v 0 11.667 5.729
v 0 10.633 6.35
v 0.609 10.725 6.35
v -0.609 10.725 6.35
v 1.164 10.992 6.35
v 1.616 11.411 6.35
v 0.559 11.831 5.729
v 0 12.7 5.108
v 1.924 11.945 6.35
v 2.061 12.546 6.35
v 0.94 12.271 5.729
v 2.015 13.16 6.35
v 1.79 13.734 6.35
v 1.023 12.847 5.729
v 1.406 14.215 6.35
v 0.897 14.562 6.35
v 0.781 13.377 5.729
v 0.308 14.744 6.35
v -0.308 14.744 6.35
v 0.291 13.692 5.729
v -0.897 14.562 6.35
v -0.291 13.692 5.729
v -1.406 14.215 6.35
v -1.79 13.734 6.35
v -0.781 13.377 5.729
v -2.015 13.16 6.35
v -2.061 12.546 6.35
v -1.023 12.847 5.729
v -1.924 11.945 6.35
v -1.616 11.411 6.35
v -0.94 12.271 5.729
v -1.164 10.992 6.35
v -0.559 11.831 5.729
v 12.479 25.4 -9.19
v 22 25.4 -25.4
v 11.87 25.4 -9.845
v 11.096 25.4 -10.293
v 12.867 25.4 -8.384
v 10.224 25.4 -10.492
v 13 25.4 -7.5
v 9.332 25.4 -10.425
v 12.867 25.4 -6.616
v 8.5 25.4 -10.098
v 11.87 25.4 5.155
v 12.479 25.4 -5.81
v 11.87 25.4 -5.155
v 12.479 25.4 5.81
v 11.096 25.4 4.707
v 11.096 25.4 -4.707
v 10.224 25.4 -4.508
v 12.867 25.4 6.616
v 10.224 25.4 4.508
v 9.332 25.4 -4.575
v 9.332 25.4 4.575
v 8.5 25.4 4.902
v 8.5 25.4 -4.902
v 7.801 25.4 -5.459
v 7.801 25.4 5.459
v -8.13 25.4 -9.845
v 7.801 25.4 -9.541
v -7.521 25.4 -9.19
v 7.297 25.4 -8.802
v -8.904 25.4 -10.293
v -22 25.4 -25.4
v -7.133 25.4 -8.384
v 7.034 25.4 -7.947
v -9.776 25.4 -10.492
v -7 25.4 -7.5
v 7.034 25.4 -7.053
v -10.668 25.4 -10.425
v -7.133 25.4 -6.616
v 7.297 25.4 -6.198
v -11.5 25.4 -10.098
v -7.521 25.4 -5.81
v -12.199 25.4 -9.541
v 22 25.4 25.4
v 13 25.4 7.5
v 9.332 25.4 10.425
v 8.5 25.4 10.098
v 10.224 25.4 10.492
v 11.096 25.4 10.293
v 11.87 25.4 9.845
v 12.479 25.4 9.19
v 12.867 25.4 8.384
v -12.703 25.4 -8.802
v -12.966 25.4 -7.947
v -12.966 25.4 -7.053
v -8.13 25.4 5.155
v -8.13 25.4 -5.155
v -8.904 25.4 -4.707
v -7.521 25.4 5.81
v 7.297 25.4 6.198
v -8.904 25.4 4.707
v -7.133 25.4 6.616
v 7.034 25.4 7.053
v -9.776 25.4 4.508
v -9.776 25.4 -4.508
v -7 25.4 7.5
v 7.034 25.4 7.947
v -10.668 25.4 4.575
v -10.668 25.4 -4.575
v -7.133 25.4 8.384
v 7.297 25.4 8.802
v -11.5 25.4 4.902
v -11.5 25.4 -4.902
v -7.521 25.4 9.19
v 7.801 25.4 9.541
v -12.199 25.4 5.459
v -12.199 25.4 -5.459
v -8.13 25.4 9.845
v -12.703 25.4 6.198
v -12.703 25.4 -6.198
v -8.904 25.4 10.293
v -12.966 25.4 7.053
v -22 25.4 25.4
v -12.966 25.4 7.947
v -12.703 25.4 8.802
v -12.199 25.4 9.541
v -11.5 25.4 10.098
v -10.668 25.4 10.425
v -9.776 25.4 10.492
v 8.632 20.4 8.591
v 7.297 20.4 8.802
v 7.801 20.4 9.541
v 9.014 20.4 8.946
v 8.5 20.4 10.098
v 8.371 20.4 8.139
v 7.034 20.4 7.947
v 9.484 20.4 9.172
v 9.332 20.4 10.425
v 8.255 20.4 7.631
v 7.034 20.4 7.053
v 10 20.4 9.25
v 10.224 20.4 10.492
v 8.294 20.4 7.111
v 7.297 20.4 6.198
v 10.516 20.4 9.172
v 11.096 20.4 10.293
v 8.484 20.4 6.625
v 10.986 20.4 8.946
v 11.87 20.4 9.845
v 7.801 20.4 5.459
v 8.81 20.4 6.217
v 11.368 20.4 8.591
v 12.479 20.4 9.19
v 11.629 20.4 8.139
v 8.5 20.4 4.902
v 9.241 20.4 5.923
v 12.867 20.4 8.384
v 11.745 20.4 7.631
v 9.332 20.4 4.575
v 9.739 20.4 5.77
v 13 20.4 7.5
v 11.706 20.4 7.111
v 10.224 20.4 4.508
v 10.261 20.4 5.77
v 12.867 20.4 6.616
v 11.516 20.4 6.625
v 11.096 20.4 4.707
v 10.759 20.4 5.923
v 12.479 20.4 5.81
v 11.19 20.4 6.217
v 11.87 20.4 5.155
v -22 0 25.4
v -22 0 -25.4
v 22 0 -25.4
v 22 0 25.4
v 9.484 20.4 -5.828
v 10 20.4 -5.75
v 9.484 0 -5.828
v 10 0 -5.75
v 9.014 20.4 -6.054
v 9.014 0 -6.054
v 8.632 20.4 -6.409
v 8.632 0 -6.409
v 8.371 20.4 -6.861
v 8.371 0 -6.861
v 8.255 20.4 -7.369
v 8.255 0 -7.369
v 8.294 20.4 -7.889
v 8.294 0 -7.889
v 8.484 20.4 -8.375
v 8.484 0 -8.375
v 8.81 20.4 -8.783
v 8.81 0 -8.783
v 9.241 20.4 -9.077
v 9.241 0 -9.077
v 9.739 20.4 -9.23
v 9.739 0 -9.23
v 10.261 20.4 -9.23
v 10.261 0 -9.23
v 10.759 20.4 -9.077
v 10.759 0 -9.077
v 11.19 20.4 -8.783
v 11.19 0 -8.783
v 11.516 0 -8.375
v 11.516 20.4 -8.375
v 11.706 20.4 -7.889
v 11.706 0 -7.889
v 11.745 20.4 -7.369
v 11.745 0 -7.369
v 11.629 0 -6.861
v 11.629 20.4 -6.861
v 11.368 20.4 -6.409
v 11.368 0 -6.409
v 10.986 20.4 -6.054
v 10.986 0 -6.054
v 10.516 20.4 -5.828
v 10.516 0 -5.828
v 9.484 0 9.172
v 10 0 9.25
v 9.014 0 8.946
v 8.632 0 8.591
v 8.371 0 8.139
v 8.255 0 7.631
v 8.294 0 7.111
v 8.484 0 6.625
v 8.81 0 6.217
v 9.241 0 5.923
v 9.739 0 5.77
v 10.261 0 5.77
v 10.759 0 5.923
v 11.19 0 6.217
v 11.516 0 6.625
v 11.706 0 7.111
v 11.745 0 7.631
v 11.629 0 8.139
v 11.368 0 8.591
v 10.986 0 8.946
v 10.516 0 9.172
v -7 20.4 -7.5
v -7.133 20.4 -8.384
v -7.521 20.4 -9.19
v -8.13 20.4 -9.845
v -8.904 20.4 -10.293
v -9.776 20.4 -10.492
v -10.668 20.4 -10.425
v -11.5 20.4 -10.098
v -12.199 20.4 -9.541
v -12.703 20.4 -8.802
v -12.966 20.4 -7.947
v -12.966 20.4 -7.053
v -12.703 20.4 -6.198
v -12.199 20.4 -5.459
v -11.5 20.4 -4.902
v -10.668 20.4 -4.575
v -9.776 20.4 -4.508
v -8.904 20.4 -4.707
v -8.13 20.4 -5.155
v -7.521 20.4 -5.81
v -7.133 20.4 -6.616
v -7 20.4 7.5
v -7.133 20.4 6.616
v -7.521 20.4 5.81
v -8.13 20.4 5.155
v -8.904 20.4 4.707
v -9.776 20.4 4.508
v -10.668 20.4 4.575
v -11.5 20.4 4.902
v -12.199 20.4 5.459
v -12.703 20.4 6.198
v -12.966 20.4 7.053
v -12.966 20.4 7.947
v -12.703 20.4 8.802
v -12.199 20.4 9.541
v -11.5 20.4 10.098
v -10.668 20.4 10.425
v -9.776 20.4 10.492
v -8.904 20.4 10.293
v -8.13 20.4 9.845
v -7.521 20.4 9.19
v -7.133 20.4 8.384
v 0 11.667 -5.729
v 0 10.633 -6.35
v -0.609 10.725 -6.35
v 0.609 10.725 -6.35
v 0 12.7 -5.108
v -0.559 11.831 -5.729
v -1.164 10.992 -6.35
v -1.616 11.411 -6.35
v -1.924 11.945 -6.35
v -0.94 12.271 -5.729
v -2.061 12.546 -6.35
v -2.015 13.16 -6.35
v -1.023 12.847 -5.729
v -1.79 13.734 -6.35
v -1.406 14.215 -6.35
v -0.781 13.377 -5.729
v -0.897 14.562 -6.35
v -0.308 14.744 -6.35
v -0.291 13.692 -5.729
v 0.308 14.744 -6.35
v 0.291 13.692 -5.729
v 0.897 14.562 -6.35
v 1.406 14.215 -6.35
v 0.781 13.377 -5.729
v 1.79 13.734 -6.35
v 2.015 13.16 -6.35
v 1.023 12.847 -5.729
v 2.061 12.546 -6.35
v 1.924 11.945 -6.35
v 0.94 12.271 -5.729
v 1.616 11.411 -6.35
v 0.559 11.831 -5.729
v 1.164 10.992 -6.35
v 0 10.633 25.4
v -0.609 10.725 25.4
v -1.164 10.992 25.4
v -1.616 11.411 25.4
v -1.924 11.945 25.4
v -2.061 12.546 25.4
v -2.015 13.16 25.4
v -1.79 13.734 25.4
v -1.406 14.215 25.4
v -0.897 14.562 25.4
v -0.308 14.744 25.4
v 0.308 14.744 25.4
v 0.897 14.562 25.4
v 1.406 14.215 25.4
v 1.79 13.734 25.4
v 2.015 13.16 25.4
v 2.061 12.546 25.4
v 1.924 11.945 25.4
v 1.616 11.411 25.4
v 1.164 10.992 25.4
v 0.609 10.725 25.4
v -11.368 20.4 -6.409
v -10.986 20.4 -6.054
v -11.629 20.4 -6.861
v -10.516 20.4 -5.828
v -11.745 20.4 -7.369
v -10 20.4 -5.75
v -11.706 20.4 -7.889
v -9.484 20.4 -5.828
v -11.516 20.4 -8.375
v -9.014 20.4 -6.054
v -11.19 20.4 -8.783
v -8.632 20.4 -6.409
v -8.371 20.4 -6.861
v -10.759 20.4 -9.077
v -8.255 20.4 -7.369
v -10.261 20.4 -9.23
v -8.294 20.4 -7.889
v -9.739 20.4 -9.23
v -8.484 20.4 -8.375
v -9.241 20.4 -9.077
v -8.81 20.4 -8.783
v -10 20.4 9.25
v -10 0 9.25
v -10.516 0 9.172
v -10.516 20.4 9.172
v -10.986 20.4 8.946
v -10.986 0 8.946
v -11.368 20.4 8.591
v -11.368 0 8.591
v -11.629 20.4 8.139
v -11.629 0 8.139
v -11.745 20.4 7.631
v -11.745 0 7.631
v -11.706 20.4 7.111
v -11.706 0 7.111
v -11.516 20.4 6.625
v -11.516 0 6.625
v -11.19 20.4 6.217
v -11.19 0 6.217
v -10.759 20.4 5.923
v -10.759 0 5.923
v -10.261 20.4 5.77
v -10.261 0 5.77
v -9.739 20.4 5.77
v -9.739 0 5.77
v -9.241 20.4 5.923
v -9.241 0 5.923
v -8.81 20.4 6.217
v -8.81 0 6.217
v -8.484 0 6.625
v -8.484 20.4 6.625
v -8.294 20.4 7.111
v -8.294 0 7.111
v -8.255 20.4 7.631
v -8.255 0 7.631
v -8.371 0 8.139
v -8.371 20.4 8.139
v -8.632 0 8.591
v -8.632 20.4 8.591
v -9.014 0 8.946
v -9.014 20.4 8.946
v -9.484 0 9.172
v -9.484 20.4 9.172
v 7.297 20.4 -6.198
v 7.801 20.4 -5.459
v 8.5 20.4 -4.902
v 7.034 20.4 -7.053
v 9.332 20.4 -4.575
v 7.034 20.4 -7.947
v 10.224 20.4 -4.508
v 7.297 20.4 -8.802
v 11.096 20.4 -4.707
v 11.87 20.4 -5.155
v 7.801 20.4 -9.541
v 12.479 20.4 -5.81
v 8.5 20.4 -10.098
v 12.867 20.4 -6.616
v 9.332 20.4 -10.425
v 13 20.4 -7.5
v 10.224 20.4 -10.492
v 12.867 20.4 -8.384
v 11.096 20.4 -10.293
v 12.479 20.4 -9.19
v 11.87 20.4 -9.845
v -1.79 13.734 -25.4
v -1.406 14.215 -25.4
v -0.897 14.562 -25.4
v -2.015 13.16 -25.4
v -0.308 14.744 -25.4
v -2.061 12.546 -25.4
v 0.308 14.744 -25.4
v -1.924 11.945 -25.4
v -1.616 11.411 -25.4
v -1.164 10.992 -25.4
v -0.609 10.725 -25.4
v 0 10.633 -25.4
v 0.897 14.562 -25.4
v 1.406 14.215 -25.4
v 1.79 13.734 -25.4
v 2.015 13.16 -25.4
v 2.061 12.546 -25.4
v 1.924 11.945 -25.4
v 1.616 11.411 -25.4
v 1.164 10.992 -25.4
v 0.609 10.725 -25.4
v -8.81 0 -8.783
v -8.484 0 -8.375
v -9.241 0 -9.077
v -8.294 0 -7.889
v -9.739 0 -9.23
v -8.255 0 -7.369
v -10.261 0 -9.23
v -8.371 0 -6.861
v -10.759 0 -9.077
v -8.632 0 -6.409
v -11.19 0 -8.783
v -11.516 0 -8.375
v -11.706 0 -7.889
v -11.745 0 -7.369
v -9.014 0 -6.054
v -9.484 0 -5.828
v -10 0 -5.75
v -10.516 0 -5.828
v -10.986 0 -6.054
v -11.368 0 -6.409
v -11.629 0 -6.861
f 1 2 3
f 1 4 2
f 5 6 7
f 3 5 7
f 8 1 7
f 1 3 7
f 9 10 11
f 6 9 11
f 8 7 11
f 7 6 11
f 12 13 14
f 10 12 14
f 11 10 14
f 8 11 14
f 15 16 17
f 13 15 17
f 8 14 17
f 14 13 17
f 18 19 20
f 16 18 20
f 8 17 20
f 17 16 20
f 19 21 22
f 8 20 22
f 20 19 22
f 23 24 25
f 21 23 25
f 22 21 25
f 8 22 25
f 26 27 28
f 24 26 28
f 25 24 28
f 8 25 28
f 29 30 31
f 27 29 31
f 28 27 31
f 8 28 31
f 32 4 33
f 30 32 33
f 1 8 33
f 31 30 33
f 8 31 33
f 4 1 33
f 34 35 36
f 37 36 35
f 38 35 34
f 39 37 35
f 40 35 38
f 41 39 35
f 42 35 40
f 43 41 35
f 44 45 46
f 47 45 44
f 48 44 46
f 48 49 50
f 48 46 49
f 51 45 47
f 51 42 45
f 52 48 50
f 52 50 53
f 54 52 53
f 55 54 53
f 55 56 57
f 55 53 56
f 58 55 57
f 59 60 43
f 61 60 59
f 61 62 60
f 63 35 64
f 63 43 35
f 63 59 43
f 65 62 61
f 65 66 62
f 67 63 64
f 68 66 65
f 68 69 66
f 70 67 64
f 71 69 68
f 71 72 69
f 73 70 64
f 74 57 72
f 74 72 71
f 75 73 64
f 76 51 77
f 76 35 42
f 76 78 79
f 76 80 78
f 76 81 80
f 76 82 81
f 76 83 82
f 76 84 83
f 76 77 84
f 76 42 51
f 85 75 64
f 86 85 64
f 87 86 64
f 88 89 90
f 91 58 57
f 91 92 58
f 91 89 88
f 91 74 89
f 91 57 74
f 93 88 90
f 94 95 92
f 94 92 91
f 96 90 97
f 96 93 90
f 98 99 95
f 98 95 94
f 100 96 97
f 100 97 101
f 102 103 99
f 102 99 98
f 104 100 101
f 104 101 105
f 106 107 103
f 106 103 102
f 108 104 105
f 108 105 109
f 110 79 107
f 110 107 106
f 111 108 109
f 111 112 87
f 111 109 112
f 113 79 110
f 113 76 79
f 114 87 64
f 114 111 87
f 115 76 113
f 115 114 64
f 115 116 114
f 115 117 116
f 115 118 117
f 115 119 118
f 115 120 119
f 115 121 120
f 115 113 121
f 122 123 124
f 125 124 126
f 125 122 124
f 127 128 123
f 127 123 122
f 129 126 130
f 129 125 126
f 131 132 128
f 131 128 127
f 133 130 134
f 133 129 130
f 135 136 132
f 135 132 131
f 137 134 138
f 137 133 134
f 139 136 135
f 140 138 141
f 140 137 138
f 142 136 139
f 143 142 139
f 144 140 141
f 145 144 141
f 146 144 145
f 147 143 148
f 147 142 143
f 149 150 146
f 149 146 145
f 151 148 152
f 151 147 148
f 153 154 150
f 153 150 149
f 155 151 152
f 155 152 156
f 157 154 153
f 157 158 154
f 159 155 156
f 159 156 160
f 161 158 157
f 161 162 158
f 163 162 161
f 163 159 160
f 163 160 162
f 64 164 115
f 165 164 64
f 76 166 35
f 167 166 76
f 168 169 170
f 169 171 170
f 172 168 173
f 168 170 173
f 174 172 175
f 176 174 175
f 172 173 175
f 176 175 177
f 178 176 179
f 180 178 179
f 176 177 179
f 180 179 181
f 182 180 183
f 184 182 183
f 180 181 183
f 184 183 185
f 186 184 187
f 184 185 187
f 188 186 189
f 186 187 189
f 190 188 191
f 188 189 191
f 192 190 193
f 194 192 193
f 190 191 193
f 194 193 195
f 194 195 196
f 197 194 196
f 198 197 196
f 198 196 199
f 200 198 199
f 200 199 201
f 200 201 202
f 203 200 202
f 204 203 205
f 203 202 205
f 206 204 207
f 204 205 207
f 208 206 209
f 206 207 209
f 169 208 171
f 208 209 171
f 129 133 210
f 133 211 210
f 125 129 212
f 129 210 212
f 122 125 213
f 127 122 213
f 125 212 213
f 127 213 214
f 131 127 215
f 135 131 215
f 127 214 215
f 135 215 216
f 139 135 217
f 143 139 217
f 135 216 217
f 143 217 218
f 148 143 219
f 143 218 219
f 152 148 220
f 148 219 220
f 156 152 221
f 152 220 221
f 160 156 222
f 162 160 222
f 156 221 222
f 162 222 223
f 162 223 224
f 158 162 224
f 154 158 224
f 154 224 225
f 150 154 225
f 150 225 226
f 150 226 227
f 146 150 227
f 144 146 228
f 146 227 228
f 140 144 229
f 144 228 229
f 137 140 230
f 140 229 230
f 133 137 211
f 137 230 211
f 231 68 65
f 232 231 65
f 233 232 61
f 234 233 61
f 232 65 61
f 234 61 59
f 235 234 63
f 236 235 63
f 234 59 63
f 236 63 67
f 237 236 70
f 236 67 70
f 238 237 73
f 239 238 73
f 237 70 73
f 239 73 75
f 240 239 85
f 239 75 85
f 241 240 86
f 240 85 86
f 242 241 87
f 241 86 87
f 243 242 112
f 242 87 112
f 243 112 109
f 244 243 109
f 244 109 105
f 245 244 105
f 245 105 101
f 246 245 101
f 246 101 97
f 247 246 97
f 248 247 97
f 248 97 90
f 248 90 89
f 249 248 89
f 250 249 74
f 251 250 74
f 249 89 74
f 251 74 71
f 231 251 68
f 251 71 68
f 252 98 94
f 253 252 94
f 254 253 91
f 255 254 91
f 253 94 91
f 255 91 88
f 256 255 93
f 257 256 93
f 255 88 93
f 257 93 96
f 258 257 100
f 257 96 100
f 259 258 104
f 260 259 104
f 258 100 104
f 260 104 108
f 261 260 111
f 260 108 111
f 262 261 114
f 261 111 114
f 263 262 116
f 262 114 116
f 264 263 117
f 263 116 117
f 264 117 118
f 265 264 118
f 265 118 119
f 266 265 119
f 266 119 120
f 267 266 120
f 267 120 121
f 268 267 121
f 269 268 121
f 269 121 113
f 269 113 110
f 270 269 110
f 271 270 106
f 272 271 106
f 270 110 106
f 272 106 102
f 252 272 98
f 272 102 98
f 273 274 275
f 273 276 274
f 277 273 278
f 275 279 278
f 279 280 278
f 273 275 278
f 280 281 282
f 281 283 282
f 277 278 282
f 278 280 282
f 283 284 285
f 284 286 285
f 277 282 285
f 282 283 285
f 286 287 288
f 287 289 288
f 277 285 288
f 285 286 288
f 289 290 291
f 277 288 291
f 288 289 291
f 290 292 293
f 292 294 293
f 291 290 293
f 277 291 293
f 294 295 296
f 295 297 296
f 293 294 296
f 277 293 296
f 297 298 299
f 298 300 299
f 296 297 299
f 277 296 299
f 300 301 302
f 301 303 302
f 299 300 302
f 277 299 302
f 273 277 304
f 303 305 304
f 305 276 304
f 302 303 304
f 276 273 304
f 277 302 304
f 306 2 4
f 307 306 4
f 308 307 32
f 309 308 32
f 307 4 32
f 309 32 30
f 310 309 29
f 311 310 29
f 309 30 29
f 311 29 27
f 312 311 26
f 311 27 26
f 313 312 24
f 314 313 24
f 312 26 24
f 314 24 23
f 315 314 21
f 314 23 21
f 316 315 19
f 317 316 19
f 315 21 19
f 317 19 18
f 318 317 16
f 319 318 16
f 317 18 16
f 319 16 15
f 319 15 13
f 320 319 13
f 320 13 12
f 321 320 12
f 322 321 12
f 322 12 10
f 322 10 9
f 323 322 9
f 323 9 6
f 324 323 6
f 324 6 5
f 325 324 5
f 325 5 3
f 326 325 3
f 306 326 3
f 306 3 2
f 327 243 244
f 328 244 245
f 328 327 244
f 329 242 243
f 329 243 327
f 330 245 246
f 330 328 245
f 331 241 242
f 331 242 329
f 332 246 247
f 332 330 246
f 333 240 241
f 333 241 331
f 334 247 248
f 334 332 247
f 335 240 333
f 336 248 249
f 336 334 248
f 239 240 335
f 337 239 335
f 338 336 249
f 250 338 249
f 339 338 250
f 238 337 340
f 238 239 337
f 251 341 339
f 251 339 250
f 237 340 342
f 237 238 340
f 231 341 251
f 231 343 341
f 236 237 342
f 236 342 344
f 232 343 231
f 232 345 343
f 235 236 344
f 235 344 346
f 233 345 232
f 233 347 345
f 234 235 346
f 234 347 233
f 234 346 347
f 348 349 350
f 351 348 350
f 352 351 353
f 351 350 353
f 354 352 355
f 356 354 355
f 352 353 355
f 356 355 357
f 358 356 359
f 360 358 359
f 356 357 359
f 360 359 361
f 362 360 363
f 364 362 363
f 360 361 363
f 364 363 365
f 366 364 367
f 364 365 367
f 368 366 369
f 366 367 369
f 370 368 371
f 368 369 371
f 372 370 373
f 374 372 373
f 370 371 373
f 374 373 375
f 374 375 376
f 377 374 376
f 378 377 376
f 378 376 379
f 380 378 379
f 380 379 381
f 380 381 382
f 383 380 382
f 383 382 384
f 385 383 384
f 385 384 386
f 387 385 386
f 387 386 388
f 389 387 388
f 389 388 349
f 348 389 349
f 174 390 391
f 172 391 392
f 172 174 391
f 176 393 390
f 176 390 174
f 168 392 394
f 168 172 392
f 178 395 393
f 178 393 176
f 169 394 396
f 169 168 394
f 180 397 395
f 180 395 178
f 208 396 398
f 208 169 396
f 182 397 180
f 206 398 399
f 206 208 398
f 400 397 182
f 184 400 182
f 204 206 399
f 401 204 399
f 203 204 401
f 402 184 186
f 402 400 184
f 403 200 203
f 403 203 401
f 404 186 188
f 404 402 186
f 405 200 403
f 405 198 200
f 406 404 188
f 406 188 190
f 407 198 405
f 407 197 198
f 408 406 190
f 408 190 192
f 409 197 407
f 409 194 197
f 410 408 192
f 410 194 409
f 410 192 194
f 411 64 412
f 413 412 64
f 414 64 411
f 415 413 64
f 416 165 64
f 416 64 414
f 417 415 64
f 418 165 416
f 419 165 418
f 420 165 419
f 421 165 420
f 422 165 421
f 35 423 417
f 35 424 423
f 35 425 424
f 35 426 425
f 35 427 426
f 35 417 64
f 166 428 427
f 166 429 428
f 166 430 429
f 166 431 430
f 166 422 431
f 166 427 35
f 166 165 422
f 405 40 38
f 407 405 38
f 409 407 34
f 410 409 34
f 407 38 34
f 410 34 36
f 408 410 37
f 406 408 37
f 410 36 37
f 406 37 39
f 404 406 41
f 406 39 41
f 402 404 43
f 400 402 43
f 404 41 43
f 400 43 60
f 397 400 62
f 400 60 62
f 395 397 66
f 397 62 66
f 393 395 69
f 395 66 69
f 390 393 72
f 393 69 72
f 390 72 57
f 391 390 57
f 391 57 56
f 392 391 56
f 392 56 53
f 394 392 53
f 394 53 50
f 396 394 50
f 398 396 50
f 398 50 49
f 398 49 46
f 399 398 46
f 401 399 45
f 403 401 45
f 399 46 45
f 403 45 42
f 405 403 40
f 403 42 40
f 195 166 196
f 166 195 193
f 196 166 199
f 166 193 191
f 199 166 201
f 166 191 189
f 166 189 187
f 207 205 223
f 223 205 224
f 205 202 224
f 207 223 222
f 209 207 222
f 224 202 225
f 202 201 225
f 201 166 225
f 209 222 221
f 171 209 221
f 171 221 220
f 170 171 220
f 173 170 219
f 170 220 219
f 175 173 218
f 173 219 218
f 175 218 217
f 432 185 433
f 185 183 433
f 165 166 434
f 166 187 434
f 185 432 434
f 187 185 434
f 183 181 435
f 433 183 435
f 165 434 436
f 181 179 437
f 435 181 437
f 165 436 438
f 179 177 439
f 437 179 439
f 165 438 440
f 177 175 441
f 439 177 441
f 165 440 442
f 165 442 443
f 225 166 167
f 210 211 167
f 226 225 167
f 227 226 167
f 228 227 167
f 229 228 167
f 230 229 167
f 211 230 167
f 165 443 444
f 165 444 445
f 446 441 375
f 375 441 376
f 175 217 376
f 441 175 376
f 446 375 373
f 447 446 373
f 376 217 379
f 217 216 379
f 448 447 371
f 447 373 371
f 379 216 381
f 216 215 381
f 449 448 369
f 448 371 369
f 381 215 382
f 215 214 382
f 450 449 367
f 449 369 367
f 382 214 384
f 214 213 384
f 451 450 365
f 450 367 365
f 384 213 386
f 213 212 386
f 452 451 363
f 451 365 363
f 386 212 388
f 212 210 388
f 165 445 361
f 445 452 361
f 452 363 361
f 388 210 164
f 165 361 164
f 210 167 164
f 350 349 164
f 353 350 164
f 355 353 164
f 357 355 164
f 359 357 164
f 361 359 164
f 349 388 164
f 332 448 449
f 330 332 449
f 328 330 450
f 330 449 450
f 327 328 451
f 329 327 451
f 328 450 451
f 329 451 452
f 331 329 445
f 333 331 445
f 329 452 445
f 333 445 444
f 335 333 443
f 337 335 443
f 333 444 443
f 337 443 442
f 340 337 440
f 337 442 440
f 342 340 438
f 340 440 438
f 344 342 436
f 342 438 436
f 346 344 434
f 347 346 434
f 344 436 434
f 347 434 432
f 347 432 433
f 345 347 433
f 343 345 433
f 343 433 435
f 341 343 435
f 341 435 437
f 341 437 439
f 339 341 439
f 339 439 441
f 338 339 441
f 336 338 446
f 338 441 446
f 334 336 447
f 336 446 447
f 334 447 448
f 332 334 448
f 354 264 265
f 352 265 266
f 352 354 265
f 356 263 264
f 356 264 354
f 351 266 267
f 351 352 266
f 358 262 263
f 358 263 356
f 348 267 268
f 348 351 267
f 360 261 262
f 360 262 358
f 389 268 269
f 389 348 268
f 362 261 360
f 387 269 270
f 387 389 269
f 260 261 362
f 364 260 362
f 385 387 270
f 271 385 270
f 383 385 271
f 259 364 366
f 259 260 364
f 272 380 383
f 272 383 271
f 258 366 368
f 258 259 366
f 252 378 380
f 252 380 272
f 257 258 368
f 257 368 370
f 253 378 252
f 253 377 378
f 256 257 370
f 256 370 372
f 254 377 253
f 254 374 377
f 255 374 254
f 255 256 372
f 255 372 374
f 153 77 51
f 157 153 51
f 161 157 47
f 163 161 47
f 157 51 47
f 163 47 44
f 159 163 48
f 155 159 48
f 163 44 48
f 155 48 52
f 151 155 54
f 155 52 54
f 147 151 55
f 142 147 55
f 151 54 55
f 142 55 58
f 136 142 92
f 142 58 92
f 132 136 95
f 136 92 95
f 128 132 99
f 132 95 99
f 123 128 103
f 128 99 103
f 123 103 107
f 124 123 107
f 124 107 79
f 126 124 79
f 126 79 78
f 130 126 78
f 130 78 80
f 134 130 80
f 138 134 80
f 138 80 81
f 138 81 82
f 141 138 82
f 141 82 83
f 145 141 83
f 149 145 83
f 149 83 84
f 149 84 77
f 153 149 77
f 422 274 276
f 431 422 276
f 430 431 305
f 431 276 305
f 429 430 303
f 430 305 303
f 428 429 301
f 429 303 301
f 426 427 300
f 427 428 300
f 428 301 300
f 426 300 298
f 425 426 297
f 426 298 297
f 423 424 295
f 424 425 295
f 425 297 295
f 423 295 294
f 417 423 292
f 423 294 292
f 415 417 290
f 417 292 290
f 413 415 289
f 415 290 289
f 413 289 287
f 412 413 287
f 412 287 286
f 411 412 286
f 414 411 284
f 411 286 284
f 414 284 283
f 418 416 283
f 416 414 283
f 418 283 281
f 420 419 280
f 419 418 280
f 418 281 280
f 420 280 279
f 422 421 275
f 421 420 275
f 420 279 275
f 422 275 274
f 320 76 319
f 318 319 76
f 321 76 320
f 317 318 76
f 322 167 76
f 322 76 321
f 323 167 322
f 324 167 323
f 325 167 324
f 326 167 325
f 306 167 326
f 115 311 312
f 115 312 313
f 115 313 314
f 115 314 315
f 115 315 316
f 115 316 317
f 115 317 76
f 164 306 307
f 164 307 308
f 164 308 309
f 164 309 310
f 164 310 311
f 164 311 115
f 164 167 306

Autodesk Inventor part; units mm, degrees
ref_plane "YZ Plane" through (0, 0, 0) normal (1, 0, 0) x (0, 1, 0)
ref_plane "XZ Plane" through (0, 0, 0) normal (0, 1, 0) x (-1, 0, 0)
ref_plane "XY Plane" through (0, 0, 0) normal (0, 0, 1) x (1, 0, 0)
sketch "Sketch2" plane through (0, 0, 0) normal (0, 1, 0) x (-1, 0, 0)
  line L0 (-22, 25.4) -> (22, 25.4)
  line L1 (22, 25.4) -> (22, -25.4)
  line L2 (22, -25.4) -> (-22, -25.4)
  line L3 (-22, -25.4) -> (-22, 25.4)
  line L4 (-22, 25.4) -> (22, -25.4) construction
  line L5 (22, 25.4) -> (-22, -25.4) construction
  point P0 (0, 0)
  dimension "d0" = 50.8
  dimension "d1" = 44
extrude "Extrusion1" add sketch "Sketch2" along normal blind 25.4
sketch "Sketch3" plane through (-22, 0, 25.4) normal (0, 0, 1) x (1, 0, 0)
  line L0 (0, 25.4) -> (44, 25.4) construction
  line L1 (0, 0) -> (44, 0) construction
  line L2 (44, 0) -> (44, 25.4) construction
  line L3 (44, 25.4) -> (0, 25.4) construction
  line L4 (0, 25.4) -> (0, 0) construction
  line L5 (0, 0) -> (44, 25.4) construction
  line L6 (44, 0) -> (0, 25.4) construction
  point P0 (22, 0)
  point P1 (22, 12.7)
hole "Hole1" at (0, 12.7, 25.4) direction (0, 0, -1) diameter 4.134 depth 19.05 tip angle 118 thread size "M5x0.8" class "6H" standard "ANSI Metric M Profile"
mirror "Mirror1" about plane through (0, 0, 0) normal (0, 0, 1) of "Hole1"
sketch "Sketch4" plane through (0, 25.4, 0) normal (0, 1, 0) x (1, 0, 0)
  line L0 (10, -7.5) -> (10, 7.5) construction
  line L1 (10, 7.5) -> (-10, 7.5) construction
  line L2 (-10, 7.5) -> (-10, -7.5) construction
  line L3 (-10, -7.5) -> (10, -7.5) construction
  line L4 (10, -7.5) -> (-10, 7.5) construction
  line L5 (10, 7.5) -> (-10, -7.5) construction
  circle A0 centre (-10, 7.5) radius 3
  circle A1 centre (10, 7.5) radius 3
  circle A2 centre (10, -7.5) radius 3
  circle A3 centre (-10, -7.5) radius 3
  point P0 (0, 0)
  dimension "d15" = 20
  dimension "d16" = 15
  dimension "d14" = 6
  dimension "d13" = 6
  dimension "d12" = 6
  dimension "d11" = 6
extrude "Extrusion2" cut sketch "Sketch4" against normal blind 5
sketch "Sketch5" plane through (-10, 20.4, 7.5) normal (0, 1, 0) x (1, 0, 0)
  circle A0 centre (0, 15) radius 3 projected
  circle A1 centre (20, 0) radius 3 projected
  circle A2 centre (20, 15) radius 3 projected
  point P0 (16, 18)
  point P1 (0, 0)
hole "Hole2" at (-10, 20.4, -7.5) at (-10, 20.4, 7.5) at (10, 20.4, 7.5) at (10, 20.4, -7.5) direction (0, -1, 0) diameter 3.5 end through all
properties part number "Mass 2" material "Steel, Mild"
